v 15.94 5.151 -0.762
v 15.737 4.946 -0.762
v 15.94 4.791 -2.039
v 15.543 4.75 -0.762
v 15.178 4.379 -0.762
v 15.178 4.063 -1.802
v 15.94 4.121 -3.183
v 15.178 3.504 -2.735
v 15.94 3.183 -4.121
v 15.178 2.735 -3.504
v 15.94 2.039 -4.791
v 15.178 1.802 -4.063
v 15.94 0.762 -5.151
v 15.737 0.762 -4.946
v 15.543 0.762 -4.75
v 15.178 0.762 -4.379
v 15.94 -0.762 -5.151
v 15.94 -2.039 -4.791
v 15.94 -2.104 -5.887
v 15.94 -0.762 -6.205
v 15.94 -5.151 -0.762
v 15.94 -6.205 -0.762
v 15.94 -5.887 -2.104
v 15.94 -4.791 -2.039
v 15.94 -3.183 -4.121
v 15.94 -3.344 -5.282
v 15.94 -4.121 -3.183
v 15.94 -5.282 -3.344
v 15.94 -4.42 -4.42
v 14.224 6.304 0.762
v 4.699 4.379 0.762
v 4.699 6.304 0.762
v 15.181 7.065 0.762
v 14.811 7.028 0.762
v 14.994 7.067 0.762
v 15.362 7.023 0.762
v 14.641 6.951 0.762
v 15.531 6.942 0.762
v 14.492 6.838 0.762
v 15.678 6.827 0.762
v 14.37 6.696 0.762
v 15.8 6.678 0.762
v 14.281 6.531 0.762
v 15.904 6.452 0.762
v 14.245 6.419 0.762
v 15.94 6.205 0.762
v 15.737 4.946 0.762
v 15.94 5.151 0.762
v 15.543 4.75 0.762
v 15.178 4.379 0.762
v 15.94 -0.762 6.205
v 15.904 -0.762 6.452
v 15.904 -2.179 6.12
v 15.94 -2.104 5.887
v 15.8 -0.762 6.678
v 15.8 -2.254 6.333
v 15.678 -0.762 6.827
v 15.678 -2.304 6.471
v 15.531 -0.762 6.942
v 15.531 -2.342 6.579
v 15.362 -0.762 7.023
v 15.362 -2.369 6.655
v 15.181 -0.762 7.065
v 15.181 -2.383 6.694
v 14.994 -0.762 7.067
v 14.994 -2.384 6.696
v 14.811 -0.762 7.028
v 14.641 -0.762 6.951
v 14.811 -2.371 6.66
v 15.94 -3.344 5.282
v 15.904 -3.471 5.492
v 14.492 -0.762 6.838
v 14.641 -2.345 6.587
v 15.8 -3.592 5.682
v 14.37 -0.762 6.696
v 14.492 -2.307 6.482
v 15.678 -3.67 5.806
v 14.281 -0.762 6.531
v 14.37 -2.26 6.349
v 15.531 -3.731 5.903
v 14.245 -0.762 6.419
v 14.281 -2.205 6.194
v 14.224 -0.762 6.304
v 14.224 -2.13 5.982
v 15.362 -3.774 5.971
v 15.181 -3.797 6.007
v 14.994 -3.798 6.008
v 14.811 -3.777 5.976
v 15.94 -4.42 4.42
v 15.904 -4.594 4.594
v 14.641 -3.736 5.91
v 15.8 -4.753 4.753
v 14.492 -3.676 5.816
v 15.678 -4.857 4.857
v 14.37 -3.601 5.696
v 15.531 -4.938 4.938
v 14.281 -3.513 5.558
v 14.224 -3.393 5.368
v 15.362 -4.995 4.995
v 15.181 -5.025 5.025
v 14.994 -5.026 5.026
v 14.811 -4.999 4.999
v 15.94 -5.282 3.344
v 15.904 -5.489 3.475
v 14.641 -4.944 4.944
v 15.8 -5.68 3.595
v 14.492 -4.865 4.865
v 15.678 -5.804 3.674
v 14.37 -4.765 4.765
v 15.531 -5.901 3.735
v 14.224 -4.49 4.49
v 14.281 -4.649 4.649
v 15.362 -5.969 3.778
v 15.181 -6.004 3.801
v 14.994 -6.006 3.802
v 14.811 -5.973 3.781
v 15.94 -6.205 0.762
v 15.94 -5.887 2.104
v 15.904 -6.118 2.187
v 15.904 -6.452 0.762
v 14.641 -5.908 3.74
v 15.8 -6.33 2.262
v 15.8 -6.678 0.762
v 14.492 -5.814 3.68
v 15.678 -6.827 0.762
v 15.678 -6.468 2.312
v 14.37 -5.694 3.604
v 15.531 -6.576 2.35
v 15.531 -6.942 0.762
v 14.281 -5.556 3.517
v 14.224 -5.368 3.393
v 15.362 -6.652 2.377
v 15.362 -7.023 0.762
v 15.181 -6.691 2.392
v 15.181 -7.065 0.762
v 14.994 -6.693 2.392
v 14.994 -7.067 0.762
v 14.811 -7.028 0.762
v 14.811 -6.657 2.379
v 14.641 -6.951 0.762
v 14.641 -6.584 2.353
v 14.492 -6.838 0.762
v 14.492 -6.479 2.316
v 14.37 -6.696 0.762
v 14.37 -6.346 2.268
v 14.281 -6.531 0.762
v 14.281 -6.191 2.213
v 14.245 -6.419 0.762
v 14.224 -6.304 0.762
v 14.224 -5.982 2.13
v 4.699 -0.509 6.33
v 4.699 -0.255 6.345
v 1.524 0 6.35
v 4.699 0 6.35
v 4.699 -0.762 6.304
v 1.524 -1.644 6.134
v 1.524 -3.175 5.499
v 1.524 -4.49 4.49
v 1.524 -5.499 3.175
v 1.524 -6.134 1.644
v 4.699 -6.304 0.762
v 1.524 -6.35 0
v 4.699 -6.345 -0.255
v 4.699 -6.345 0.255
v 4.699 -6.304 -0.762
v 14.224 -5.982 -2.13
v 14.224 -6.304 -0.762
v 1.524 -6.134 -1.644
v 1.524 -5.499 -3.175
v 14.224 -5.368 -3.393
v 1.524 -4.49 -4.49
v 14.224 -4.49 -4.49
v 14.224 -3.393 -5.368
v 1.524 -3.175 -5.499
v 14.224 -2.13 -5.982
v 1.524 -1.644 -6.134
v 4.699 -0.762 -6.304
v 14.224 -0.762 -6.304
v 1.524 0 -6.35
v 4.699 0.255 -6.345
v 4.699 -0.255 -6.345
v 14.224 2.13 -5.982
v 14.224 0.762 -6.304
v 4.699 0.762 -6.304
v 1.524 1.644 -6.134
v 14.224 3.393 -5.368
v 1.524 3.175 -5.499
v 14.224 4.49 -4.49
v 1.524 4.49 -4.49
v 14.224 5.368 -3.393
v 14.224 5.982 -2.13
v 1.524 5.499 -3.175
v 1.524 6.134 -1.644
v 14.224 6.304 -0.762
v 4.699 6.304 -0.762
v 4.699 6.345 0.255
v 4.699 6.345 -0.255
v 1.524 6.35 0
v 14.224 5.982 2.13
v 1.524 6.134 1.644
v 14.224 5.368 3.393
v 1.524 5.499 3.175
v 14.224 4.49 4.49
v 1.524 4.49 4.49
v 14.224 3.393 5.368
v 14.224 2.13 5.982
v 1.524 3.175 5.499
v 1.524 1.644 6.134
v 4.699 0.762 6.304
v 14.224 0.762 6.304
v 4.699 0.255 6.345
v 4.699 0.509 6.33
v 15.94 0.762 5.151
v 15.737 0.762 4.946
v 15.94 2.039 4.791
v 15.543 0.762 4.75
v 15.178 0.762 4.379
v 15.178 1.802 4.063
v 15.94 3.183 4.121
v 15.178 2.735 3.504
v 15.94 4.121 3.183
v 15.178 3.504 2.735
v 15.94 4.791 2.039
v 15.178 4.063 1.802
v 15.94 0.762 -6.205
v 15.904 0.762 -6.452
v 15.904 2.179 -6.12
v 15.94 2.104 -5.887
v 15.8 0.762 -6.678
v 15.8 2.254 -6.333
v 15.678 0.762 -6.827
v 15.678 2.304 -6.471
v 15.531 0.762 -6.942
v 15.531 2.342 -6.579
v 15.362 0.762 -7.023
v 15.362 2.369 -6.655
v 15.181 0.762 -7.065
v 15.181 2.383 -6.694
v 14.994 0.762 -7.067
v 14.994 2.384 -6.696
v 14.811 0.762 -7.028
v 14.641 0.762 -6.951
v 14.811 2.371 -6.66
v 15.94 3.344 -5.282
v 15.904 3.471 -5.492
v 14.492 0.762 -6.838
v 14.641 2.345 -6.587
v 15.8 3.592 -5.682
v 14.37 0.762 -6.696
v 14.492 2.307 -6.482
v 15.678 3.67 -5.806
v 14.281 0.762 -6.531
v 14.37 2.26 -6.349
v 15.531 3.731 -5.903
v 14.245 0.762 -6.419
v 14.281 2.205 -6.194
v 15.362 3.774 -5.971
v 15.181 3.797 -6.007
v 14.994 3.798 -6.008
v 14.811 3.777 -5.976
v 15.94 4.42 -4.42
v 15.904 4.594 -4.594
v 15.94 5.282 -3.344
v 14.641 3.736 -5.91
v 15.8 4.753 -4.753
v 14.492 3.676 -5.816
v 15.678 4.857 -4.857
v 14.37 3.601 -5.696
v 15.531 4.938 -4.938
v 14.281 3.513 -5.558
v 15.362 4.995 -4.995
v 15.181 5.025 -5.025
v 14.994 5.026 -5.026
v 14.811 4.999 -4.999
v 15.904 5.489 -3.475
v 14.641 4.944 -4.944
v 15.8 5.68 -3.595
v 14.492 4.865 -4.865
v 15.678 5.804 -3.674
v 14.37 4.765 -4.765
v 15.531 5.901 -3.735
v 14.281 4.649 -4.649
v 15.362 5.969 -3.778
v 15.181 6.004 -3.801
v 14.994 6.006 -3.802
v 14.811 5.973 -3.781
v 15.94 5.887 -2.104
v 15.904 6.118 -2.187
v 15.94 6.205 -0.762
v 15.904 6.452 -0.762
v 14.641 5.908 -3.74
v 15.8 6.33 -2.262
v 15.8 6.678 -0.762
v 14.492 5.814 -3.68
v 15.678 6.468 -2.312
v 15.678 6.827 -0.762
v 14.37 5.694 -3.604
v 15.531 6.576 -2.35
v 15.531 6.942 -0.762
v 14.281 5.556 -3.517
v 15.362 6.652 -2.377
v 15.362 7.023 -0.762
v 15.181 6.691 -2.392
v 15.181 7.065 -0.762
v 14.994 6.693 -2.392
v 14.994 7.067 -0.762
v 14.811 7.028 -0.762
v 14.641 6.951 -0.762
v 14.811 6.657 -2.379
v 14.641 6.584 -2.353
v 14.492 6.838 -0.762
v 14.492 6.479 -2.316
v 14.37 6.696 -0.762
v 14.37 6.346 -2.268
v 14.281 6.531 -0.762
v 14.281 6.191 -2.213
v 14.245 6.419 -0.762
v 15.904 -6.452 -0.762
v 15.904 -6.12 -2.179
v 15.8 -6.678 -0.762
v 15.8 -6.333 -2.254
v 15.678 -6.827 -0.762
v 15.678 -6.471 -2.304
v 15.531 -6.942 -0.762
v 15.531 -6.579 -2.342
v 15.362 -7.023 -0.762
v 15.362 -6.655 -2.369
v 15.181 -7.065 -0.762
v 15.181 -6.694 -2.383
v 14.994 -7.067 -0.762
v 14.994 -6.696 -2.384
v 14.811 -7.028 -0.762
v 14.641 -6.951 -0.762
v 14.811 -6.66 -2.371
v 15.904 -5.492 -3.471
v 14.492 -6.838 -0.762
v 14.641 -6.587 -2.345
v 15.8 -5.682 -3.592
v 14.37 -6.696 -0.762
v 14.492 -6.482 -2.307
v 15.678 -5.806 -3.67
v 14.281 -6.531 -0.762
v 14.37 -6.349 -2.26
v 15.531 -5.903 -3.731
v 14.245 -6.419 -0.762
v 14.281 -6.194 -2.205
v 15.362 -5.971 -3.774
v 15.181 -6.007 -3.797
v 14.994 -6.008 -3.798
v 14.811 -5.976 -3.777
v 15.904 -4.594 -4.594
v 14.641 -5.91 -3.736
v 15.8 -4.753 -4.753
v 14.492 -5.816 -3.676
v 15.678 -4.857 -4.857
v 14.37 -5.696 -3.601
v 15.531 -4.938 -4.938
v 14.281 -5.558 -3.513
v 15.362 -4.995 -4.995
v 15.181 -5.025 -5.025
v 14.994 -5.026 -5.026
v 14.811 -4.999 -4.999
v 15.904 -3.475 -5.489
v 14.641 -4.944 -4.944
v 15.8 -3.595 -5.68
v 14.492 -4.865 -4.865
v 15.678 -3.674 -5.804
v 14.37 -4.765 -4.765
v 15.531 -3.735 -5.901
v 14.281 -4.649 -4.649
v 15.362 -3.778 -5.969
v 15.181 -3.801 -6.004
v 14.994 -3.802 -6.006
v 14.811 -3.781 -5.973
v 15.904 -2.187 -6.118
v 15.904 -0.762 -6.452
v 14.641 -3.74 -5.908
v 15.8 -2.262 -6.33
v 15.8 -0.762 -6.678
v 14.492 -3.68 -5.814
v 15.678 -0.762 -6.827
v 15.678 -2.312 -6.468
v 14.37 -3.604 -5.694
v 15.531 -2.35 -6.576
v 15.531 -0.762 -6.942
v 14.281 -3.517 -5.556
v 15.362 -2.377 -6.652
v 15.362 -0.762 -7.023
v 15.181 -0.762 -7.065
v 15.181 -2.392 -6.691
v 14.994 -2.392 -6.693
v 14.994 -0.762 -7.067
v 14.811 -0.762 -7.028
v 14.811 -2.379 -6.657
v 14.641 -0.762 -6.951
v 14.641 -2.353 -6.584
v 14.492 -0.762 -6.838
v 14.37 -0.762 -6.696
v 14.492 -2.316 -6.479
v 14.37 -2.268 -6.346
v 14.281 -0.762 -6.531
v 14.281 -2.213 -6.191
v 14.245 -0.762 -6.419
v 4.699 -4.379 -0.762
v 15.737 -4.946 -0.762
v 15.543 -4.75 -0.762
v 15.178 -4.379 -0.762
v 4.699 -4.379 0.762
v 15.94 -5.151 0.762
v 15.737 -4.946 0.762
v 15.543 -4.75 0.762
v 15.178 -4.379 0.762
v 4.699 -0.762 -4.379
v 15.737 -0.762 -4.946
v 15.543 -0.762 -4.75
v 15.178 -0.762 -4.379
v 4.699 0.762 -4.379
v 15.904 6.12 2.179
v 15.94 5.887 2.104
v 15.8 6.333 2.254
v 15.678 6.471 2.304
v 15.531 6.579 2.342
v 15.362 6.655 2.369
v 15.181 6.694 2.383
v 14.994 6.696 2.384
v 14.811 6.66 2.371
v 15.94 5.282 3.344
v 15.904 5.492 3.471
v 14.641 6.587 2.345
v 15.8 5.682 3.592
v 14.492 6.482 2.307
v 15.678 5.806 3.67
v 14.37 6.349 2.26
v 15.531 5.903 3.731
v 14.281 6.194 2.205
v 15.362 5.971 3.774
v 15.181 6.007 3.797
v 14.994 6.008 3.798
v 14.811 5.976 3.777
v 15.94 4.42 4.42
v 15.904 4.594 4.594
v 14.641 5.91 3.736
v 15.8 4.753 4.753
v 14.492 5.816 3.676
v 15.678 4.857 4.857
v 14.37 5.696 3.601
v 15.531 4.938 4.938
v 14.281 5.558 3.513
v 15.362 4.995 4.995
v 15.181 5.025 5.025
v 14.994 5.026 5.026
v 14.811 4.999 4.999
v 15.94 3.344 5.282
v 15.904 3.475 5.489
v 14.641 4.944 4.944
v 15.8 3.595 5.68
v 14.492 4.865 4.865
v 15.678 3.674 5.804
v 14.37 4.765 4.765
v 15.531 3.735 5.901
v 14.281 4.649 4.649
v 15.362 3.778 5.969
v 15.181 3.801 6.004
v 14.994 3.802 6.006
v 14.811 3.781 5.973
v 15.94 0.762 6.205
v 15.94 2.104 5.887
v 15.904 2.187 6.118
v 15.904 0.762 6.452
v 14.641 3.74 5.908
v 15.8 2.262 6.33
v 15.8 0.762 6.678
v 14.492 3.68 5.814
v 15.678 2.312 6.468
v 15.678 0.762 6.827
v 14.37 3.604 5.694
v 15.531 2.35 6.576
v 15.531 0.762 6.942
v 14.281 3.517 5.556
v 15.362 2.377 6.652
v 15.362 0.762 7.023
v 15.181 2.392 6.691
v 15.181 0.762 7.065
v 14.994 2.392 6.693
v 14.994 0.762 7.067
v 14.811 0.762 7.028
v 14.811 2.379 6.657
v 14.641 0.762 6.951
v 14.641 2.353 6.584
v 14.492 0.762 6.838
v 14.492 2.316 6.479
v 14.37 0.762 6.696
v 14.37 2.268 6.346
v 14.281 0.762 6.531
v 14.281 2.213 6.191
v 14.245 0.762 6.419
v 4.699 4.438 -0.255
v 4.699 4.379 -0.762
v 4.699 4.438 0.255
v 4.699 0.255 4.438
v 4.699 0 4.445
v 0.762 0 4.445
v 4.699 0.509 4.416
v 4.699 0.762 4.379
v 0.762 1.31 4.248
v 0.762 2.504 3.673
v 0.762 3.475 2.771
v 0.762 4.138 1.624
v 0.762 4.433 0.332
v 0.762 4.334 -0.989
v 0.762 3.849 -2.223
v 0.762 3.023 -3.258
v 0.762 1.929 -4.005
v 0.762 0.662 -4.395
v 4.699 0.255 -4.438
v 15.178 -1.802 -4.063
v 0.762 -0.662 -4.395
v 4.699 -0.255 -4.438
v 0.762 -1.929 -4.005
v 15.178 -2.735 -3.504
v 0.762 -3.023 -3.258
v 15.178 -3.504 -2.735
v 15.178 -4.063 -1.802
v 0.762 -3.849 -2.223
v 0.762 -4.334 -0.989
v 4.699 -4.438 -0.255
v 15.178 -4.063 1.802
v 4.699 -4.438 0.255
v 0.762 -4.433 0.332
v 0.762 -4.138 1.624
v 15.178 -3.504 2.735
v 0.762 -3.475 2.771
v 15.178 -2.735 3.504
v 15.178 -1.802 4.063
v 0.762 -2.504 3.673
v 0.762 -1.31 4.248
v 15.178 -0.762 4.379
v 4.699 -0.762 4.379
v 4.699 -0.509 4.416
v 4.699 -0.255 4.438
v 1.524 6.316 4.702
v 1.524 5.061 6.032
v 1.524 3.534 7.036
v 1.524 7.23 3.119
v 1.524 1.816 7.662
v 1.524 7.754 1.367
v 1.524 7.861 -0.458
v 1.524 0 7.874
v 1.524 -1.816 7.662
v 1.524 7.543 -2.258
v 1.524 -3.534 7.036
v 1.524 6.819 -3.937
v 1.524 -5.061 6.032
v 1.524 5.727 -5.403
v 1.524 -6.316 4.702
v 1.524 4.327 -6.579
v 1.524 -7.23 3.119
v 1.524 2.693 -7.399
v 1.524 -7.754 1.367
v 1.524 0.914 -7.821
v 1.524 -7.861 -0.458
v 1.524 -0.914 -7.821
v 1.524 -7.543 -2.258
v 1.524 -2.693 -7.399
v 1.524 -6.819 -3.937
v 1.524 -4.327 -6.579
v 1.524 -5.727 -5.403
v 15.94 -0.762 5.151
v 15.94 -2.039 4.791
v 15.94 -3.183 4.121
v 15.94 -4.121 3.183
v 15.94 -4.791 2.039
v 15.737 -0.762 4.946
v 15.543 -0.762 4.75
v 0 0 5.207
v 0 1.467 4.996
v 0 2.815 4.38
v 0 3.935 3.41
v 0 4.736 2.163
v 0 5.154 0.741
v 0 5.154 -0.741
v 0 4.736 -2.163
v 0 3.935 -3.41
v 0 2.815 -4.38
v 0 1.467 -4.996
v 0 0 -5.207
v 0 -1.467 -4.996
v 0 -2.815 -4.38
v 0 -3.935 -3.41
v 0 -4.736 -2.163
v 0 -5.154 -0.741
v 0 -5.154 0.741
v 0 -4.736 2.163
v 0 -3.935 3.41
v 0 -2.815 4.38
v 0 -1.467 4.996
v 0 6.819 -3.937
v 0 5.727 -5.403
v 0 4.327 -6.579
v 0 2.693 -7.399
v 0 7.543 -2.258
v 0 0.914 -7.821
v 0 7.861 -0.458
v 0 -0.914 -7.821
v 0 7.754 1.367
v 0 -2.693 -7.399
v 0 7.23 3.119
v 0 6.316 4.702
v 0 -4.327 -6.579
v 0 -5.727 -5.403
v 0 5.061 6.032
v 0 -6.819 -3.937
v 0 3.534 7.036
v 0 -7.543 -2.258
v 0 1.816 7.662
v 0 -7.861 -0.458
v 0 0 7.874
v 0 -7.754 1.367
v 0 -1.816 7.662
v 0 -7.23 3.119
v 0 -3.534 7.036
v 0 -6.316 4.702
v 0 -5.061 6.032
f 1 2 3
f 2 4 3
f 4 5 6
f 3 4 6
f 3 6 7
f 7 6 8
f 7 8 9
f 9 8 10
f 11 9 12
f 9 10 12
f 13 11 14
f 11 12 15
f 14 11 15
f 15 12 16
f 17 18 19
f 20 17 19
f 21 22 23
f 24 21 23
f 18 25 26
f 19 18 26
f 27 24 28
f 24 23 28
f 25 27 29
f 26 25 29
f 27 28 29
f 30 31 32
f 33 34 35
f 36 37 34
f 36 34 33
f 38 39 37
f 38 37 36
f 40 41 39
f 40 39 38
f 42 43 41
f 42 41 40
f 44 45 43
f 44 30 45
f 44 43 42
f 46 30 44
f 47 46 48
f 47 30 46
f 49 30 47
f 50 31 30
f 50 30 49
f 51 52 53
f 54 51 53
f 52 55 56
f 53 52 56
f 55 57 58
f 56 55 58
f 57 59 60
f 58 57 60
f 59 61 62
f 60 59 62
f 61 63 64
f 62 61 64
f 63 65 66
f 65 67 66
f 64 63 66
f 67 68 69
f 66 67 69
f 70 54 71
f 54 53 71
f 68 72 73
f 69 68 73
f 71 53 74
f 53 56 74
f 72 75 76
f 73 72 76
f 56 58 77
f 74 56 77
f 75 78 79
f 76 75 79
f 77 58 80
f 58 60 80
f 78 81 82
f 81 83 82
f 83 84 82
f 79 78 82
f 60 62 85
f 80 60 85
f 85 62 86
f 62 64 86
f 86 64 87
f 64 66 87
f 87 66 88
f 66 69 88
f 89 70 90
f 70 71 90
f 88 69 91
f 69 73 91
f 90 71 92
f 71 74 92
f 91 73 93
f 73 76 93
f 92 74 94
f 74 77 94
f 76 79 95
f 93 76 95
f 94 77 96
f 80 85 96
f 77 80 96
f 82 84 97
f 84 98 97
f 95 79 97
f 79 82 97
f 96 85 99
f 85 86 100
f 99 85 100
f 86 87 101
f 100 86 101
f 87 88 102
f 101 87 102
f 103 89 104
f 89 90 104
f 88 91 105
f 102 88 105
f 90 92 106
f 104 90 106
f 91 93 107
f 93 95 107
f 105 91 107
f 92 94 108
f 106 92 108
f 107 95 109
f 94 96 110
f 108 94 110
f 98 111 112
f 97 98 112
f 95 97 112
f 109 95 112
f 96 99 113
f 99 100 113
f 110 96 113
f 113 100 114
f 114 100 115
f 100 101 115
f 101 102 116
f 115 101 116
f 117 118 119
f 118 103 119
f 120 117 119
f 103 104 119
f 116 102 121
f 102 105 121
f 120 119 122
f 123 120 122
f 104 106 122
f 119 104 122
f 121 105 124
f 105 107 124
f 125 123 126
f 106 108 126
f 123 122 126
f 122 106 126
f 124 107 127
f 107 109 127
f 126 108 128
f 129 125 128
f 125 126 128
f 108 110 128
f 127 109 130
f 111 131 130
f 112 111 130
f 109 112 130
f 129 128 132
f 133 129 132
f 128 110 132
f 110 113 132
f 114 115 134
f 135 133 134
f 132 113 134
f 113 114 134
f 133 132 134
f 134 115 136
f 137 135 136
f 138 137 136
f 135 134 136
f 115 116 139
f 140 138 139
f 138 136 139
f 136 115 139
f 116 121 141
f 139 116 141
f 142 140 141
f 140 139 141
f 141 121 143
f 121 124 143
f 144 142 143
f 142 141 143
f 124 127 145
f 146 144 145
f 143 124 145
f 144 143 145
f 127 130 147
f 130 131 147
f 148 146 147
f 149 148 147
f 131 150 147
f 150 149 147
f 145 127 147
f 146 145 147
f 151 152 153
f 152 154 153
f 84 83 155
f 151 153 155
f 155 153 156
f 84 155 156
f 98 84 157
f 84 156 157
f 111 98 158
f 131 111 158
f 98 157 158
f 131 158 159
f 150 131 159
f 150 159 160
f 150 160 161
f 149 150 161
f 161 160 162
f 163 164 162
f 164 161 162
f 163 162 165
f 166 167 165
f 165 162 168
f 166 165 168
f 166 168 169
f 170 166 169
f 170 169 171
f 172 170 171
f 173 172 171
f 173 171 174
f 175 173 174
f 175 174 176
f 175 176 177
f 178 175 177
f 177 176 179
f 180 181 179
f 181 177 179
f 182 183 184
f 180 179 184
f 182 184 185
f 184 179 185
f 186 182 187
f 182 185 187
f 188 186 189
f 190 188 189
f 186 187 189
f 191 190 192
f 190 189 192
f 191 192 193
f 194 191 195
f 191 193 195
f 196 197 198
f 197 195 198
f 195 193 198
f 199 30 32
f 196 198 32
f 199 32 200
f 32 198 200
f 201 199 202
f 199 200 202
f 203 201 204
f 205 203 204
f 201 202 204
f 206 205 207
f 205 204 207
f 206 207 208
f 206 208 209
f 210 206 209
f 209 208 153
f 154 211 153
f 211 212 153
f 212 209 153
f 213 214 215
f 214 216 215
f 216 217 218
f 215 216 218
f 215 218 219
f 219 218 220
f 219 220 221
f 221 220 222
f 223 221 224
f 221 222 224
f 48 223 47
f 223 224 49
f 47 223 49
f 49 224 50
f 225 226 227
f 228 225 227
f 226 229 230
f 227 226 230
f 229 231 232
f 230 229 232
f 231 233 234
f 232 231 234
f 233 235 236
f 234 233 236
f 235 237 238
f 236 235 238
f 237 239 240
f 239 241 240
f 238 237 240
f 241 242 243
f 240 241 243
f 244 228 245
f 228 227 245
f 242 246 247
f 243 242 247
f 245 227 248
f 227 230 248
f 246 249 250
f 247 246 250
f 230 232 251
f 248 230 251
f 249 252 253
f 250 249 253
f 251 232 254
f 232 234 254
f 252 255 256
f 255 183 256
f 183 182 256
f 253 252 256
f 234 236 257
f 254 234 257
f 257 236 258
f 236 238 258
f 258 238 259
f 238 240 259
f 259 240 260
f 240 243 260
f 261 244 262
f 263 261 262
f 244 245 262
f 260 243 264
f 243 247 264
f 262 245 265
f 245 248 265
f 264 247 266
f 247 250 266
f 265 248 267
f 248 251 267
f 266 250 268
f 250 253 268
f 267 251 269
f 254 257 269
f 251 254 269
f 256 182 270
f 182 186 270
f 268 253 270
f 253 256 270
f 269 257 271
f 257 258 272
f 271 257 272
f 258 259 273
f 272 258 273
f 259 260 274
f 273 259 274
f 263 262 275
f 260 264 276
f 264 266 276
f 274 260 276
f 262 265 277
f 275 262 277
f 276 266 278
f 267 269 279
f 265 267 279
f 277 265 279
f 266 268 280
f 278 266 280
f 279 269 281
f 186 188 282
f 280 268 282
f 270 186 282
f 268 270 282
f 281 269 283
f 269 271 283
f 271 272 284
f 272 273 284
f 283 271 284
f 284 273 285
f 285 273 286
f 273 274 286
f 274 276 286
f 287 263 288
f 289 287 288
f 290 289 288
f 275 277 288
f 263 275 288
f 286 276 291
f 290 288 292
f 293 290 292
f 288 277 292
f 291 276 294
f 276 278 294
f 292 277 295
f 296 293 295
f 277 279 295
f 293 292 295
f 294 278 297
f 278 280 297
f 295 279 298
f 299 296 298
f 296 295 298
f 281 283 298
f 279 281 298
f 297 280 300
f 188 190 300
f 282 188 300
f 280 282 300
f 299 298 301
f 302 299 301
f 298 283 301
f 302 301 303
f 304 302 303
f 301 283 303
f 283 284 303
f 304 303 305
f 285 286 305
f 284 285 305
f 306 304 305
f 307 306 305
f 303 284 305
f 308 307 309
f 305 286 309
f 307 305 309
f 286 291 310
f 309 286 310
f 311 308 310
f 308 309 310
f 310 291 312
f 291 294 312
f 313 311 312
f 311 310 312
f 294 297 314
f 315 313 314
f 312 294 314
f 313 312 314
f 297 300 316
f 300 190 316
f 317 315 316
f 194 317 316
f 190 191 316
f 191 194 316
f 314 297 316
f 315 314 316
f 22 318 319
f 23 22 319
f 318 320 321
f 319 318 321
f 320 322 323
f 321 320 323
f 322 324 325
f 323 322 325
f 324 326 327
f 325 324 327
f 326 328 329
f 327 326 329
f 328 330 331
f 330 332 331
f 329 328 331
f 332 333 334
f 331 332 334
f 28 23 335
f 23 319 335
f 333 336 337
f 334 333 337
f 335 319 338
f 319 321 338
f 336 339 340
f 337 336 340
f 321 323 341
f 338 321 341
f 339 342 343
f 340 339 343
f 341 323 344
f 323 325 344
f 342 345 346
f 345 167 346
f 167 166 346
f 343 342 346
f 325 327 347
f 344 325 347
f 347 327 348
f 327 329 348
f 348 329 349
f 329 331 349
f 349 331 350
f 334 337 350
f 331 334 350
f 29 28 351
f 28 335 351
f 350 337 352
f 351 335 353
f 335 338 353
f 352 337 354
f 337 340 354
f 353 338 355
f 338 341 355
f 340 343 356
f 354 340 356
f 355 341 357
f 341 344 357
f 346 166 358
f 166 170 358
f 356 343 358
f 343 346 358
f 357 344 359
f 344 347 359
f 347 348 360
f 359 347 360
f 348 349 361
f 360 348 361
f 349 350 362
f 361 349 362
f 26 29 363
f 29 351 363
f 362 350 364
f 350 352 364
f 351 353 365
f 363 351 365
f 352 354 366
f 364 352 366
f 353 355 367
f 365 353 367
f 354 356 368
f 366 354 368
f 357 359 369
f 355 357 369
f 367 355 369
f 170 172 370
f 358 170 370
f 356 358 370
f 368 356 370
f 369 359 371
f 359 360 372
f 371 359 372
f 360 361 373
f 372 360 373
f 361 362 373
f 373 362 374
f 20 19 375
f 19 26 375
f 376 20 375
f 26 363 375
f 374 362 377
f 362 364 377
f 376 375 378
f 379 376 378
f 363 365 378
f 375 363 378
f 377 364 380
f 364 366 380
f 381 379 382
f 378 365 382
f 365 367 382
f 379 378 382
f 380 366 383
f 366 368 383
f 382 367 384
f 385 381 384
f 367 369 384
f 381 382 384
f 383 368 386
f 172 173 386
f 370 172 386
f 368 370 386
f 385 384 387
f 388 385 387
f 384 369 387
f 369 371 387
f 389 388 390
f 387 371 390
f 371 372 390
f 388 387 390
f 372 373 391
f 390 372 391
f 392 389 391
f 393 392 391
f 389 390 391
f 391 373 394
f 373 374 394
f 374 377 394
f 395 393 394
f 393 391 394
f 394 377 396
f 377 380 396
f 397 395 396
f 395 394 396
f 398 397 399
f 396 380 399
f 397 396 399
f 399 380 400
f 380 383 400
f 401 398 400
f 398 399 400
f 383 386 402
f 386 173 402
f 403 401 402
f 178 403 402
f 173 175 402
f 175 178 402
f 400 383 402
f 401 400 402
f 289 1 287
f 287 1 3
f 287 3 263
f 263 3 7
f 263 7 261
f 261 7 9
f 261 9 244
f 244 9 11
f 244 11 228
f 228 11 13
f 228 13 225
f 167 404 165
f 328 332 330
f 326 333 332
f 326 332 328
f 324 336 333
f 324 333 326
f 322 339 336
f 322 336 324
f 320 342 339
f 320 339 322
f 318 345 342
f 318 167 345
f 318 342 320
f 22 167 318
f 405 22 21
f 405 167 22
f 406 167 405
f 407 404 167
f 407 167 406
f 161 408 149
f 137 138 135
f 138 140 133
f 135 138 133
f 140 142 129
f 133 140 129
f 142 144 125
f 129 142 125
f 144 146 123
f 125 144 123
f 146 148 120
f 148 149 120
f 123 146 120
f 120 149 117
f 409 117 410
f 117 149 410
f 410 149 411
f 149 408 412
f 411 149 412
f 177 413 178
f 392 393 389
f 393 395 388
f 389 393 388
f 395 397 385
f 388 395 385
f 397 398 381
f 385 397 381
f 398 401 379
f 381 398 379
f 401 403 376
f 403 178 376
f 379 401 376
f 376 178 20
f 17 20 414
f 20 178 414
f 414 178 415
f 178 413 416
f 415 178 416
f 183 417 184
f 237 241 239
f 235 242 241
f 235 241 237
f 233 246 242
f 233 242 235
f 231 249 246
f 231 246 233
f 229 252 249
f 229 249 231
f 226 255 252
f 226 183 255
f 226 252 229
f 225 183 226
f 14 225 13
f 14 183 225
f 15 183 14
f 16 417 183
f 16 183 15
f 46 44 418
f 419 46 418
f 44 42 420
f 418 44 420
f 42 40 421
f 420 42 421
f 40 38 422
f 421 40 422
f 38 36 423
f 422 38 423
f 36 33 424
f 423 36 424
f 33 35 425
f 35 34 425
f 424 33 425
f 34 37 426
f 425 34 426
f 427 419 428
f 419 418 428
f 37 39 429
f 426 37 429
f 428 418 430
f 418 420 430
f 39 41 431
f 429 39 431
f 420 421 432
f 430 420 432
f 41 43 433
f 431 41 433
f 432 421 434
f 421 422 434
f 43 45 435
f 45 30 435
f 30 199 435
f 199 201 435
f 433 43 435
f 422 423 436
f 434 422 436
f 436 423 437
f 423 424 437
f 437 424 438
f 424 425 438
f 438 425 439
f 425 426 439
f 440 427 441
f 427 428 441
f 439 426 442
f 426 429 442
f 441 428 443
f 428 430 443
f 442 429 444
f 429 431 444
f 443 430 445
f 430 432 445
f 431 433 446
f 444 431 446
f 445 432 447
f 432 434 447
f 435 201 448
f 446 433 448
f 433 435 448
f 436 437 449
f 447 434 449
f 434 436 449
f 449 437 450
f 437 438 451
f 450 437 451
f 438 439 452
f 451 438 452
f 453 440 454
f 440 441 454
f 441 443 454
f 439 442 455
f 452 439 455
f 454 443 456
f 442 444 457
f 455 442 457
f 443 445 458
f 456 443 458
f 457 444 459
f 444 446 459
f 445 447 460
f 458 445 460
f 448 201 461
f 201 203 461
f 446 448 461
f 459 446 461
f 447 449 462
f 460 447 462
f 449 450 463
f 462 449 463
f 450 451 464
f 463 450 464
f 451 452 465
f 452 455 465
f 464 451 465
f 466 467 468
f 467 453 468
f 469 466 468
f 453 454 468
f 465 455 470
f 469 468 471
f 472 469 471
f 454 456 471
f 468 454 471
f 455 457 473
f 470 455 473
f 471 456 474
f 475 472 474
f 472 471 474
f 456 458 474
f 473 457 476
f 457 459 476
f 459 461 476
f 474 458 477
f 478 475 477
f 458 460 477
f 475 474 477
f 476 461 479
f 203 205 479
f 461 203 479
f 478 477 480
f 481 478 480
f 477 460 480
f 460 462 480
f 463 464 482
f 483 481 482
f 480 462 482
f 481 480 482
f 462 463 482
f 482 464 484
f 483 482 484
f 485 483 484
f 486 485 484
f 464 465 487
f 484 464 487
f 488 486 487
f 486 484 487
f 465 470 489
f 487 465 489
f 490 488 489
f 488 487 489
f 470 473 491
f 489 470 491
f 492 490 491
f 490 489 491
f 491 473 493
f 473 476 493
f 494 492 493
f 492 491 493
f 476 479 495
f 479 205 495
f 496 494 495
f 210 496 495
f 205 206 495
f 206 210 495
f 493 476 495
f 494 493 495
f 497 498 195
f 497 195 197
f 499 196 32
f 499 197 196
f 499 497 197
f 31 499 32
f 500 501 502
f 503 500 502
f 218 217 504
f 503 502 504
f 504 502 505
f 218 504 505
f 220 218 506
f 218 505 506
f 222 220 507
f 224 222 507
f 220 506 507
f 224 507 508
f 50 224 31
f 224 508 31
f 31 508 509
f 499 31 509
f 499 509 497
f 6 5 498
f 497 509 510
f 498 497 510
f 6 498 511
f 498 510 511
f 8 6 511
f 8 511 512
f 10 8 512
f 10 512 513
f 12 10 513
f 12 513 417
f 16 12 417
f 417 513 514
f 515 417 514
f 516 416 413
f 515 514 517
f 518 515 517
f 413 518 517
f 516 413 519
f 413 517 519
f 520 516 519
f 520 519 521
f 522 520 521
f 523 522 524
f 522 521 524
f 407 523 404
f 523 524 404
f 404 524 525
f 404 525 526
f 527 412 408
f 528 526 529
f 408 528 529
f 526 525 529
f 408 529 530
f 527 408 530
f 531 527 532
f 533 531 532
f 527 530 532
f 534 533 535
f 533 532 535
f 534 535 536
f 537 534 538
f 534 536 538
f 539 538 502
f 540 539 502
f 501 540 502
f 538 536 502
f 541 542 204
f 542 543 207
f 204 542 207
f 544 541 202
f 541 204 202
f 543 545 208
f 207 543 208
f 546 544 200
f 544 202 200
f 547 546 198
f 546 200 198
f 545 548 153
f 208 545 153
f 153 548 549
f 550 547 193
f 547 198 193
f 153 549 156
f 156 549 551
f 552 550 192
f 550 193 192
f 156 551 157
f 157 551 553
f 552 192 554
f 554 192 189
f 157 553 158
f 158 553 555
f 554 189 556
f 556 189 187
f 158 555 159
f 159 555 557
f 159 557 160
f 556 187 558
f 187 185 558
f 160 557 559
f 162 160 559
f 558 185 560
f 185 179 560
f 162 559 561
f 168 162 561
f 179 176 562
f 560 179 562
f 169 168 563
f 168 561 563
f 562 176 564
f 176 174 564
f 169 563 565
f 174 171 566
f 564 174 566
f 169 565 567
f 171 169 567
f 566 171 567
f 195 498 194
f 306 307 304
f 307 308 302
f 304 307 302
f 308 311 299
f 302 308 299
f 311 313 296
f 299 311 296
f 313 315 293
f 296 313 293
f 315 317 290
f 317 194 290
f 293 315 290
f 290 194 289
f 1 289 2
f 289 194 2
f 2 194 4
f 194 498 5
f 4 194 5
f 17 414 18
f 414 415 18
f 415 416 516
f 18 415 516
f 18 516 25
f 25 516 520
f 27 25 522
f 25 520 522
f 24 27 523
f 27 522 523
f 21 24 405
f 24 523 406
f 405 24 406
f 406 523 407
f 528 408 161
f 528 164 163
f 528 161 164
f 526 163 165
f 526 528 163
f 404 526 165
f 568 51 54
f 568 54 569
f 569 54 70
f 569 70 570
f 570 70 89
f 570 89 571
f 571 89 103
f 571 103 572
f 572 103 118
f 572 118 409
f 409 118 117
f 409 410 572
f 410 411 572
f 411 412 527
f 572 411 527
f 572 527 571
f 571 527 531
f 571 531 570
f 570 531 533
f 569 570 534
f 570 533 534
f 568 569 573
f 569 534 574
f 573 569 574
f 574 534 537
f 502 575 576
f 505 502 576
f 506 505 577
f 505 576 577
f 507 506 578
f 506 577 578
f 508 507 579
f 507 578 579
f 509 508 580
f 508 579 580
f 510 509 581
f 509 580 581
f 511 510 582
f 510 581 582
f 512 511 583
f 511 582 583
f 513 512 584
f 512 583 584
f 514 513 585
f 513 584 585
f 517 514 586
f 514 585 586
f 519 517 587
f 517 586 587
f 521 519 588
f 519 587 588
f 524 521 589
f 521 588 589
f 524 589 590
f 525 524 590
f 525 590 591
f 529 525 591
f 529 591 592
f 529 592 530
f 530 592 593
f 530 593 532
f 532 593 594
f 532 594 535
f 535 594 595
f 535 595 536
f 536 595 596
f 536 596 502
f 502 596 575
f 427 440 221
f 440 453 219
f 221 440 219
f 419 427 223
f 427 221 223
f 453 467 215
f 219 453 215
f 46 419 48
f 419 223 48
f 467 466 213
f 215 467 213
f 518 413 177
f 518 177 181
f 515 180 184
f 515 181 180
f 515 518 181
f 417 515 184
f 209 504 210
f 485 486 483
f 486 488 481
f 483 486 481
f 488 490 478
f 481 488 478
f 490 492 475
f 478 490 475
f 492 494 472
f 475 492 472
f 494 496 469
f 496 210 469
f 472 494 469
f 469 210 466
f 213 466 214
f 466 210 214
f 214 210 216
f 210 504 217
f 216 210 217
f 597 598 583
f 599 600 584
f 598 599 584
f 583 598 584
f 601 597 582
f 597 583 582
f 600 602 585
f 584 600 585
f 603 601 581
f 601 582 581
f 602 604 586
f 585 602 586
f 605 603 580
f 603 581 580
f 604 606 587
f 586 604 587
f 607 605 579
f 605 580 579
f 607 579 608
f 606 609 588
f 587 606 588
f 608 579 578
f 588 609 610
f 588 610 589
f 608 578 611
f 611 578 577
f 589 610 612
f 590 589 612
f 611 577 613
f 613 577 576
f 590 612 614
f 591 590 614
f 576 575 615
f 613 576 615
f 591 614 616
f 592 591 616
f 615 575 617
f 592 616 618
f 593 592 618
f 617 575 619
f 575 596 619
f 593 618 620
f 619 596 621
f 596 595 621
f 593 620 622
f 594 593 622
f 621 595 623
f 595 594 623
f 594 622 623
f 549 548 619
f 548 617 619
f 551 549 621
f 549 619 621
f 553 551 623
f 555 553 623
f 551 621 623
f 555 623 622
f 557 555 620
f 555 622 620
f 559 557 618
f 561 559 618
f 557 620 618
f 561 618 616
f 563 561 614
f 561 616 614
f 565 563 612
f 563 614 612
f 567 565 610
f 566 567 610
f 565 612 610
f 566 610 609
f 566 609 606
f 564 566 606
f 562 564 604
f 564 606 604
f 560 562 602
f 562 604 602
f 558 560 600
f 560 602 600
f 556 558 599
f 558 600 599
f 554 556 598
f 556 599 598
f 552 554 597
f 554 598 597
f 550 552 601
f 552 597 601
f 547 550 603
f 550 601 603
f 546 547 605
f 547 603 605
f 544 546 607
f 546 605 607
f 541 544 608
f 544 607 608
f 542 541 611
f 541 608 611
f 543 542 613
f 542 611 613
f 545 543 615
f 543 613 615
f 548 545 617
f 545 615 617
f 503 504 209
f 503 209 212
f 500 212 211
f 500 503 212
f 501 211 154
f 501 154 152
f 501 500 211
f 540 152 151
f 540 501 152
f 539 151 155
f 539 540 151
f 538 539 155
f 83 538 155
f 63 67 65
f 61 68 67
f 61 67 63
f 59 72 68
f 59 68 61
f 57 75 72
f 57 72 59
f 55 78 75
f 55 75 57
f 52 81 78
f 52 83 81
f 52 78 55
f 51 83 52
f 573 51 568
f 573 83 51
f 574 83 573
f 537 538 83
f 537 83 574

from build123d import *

# Parameters (mm, degrees)
SKETCH2_R          = 4.445
CUT_EXTRUDE1_DEPTH = 18.034
CHAMFER1_SIZE      = 0.762
SKETCH5_W          = 11.240575932
SKETCH5_H          = 1.524
CUT_EXTRUDE2_DEPTH = 20.444017921
CIRPATTERN1_COUNT  = 4


with BuildPart() as part:
    # Sketch1 → Revolve1 (revolve)
    with BuildSketch(Plane.XY, mode=Mode.PRIVATE) as revolve1_sk:
        with BuildLine():
            Line((0, 0), (15.939575932, 0))
            Line((15.939575932, 0), (15.939575932, 6.251377289))
            ThreePointArc((15.939575932, 6.251377289), (15.12834599, 7.110581459), (14.224, 6.35))
            Line((14.224, 6.35), (1.524, 6.35))
            Line((1.524, 6.35), (1.524, 7.874))
            Line((1.524, 7.874), (0, 7.874))
            Line((0, 7.874), (0, 0))
        make_face()
    revolve(revolve1_sk.sketch.rotate(Axis((0, 0, 0), (1, 0, 0)), 90), axis=Axis((0, 0, 0), (1, 0, 0)))

    # Sketch2 → Cut-Extrude1 (cut)
    with BuildSketch(Plane.ZY):
        Circle(SKETCH2_R)
    extrude(amount=-CUT_EXTRUDE1_DEPTH, mode=Mode.SUBTRACT)

    # Chamfer1
    chamfer1_edges = [part.edges().sort_by_distance(p)[0] for p in [
        (15.939575932, 0, -4.445),
        (0, 0, -4.445),
    ]]
    chamfer(chamfer1_edges, length=CHAMFER1_SIZE)

    # Sketch5 → Cut-Extrude2 (cut, through all)
    with BuildSketch(Plane.XY):
        with Locations((10.319287966, 0)):
            Rectangle(SKETCH5_W, SKETCH5_H)
    cut_extrude2 = extrude(amount=-CUT_EXTRUDE2_DEPTH, mode=Mode.SUBTRACT)

    # CirPattern1: Cut-Extrude2 ×4 about axis
    cirpattern1_axis = Axis((0, 0, 0), (1, 0, 0))
    for i in range(1, CIRPATTERN1_COUNT):
        add(cut_extrude2.rotate(cirpattern1_axis, i * 360 / CIRPATTERN1_COUNT), mode=Mode.SUBTRACT)


solid = part.part
